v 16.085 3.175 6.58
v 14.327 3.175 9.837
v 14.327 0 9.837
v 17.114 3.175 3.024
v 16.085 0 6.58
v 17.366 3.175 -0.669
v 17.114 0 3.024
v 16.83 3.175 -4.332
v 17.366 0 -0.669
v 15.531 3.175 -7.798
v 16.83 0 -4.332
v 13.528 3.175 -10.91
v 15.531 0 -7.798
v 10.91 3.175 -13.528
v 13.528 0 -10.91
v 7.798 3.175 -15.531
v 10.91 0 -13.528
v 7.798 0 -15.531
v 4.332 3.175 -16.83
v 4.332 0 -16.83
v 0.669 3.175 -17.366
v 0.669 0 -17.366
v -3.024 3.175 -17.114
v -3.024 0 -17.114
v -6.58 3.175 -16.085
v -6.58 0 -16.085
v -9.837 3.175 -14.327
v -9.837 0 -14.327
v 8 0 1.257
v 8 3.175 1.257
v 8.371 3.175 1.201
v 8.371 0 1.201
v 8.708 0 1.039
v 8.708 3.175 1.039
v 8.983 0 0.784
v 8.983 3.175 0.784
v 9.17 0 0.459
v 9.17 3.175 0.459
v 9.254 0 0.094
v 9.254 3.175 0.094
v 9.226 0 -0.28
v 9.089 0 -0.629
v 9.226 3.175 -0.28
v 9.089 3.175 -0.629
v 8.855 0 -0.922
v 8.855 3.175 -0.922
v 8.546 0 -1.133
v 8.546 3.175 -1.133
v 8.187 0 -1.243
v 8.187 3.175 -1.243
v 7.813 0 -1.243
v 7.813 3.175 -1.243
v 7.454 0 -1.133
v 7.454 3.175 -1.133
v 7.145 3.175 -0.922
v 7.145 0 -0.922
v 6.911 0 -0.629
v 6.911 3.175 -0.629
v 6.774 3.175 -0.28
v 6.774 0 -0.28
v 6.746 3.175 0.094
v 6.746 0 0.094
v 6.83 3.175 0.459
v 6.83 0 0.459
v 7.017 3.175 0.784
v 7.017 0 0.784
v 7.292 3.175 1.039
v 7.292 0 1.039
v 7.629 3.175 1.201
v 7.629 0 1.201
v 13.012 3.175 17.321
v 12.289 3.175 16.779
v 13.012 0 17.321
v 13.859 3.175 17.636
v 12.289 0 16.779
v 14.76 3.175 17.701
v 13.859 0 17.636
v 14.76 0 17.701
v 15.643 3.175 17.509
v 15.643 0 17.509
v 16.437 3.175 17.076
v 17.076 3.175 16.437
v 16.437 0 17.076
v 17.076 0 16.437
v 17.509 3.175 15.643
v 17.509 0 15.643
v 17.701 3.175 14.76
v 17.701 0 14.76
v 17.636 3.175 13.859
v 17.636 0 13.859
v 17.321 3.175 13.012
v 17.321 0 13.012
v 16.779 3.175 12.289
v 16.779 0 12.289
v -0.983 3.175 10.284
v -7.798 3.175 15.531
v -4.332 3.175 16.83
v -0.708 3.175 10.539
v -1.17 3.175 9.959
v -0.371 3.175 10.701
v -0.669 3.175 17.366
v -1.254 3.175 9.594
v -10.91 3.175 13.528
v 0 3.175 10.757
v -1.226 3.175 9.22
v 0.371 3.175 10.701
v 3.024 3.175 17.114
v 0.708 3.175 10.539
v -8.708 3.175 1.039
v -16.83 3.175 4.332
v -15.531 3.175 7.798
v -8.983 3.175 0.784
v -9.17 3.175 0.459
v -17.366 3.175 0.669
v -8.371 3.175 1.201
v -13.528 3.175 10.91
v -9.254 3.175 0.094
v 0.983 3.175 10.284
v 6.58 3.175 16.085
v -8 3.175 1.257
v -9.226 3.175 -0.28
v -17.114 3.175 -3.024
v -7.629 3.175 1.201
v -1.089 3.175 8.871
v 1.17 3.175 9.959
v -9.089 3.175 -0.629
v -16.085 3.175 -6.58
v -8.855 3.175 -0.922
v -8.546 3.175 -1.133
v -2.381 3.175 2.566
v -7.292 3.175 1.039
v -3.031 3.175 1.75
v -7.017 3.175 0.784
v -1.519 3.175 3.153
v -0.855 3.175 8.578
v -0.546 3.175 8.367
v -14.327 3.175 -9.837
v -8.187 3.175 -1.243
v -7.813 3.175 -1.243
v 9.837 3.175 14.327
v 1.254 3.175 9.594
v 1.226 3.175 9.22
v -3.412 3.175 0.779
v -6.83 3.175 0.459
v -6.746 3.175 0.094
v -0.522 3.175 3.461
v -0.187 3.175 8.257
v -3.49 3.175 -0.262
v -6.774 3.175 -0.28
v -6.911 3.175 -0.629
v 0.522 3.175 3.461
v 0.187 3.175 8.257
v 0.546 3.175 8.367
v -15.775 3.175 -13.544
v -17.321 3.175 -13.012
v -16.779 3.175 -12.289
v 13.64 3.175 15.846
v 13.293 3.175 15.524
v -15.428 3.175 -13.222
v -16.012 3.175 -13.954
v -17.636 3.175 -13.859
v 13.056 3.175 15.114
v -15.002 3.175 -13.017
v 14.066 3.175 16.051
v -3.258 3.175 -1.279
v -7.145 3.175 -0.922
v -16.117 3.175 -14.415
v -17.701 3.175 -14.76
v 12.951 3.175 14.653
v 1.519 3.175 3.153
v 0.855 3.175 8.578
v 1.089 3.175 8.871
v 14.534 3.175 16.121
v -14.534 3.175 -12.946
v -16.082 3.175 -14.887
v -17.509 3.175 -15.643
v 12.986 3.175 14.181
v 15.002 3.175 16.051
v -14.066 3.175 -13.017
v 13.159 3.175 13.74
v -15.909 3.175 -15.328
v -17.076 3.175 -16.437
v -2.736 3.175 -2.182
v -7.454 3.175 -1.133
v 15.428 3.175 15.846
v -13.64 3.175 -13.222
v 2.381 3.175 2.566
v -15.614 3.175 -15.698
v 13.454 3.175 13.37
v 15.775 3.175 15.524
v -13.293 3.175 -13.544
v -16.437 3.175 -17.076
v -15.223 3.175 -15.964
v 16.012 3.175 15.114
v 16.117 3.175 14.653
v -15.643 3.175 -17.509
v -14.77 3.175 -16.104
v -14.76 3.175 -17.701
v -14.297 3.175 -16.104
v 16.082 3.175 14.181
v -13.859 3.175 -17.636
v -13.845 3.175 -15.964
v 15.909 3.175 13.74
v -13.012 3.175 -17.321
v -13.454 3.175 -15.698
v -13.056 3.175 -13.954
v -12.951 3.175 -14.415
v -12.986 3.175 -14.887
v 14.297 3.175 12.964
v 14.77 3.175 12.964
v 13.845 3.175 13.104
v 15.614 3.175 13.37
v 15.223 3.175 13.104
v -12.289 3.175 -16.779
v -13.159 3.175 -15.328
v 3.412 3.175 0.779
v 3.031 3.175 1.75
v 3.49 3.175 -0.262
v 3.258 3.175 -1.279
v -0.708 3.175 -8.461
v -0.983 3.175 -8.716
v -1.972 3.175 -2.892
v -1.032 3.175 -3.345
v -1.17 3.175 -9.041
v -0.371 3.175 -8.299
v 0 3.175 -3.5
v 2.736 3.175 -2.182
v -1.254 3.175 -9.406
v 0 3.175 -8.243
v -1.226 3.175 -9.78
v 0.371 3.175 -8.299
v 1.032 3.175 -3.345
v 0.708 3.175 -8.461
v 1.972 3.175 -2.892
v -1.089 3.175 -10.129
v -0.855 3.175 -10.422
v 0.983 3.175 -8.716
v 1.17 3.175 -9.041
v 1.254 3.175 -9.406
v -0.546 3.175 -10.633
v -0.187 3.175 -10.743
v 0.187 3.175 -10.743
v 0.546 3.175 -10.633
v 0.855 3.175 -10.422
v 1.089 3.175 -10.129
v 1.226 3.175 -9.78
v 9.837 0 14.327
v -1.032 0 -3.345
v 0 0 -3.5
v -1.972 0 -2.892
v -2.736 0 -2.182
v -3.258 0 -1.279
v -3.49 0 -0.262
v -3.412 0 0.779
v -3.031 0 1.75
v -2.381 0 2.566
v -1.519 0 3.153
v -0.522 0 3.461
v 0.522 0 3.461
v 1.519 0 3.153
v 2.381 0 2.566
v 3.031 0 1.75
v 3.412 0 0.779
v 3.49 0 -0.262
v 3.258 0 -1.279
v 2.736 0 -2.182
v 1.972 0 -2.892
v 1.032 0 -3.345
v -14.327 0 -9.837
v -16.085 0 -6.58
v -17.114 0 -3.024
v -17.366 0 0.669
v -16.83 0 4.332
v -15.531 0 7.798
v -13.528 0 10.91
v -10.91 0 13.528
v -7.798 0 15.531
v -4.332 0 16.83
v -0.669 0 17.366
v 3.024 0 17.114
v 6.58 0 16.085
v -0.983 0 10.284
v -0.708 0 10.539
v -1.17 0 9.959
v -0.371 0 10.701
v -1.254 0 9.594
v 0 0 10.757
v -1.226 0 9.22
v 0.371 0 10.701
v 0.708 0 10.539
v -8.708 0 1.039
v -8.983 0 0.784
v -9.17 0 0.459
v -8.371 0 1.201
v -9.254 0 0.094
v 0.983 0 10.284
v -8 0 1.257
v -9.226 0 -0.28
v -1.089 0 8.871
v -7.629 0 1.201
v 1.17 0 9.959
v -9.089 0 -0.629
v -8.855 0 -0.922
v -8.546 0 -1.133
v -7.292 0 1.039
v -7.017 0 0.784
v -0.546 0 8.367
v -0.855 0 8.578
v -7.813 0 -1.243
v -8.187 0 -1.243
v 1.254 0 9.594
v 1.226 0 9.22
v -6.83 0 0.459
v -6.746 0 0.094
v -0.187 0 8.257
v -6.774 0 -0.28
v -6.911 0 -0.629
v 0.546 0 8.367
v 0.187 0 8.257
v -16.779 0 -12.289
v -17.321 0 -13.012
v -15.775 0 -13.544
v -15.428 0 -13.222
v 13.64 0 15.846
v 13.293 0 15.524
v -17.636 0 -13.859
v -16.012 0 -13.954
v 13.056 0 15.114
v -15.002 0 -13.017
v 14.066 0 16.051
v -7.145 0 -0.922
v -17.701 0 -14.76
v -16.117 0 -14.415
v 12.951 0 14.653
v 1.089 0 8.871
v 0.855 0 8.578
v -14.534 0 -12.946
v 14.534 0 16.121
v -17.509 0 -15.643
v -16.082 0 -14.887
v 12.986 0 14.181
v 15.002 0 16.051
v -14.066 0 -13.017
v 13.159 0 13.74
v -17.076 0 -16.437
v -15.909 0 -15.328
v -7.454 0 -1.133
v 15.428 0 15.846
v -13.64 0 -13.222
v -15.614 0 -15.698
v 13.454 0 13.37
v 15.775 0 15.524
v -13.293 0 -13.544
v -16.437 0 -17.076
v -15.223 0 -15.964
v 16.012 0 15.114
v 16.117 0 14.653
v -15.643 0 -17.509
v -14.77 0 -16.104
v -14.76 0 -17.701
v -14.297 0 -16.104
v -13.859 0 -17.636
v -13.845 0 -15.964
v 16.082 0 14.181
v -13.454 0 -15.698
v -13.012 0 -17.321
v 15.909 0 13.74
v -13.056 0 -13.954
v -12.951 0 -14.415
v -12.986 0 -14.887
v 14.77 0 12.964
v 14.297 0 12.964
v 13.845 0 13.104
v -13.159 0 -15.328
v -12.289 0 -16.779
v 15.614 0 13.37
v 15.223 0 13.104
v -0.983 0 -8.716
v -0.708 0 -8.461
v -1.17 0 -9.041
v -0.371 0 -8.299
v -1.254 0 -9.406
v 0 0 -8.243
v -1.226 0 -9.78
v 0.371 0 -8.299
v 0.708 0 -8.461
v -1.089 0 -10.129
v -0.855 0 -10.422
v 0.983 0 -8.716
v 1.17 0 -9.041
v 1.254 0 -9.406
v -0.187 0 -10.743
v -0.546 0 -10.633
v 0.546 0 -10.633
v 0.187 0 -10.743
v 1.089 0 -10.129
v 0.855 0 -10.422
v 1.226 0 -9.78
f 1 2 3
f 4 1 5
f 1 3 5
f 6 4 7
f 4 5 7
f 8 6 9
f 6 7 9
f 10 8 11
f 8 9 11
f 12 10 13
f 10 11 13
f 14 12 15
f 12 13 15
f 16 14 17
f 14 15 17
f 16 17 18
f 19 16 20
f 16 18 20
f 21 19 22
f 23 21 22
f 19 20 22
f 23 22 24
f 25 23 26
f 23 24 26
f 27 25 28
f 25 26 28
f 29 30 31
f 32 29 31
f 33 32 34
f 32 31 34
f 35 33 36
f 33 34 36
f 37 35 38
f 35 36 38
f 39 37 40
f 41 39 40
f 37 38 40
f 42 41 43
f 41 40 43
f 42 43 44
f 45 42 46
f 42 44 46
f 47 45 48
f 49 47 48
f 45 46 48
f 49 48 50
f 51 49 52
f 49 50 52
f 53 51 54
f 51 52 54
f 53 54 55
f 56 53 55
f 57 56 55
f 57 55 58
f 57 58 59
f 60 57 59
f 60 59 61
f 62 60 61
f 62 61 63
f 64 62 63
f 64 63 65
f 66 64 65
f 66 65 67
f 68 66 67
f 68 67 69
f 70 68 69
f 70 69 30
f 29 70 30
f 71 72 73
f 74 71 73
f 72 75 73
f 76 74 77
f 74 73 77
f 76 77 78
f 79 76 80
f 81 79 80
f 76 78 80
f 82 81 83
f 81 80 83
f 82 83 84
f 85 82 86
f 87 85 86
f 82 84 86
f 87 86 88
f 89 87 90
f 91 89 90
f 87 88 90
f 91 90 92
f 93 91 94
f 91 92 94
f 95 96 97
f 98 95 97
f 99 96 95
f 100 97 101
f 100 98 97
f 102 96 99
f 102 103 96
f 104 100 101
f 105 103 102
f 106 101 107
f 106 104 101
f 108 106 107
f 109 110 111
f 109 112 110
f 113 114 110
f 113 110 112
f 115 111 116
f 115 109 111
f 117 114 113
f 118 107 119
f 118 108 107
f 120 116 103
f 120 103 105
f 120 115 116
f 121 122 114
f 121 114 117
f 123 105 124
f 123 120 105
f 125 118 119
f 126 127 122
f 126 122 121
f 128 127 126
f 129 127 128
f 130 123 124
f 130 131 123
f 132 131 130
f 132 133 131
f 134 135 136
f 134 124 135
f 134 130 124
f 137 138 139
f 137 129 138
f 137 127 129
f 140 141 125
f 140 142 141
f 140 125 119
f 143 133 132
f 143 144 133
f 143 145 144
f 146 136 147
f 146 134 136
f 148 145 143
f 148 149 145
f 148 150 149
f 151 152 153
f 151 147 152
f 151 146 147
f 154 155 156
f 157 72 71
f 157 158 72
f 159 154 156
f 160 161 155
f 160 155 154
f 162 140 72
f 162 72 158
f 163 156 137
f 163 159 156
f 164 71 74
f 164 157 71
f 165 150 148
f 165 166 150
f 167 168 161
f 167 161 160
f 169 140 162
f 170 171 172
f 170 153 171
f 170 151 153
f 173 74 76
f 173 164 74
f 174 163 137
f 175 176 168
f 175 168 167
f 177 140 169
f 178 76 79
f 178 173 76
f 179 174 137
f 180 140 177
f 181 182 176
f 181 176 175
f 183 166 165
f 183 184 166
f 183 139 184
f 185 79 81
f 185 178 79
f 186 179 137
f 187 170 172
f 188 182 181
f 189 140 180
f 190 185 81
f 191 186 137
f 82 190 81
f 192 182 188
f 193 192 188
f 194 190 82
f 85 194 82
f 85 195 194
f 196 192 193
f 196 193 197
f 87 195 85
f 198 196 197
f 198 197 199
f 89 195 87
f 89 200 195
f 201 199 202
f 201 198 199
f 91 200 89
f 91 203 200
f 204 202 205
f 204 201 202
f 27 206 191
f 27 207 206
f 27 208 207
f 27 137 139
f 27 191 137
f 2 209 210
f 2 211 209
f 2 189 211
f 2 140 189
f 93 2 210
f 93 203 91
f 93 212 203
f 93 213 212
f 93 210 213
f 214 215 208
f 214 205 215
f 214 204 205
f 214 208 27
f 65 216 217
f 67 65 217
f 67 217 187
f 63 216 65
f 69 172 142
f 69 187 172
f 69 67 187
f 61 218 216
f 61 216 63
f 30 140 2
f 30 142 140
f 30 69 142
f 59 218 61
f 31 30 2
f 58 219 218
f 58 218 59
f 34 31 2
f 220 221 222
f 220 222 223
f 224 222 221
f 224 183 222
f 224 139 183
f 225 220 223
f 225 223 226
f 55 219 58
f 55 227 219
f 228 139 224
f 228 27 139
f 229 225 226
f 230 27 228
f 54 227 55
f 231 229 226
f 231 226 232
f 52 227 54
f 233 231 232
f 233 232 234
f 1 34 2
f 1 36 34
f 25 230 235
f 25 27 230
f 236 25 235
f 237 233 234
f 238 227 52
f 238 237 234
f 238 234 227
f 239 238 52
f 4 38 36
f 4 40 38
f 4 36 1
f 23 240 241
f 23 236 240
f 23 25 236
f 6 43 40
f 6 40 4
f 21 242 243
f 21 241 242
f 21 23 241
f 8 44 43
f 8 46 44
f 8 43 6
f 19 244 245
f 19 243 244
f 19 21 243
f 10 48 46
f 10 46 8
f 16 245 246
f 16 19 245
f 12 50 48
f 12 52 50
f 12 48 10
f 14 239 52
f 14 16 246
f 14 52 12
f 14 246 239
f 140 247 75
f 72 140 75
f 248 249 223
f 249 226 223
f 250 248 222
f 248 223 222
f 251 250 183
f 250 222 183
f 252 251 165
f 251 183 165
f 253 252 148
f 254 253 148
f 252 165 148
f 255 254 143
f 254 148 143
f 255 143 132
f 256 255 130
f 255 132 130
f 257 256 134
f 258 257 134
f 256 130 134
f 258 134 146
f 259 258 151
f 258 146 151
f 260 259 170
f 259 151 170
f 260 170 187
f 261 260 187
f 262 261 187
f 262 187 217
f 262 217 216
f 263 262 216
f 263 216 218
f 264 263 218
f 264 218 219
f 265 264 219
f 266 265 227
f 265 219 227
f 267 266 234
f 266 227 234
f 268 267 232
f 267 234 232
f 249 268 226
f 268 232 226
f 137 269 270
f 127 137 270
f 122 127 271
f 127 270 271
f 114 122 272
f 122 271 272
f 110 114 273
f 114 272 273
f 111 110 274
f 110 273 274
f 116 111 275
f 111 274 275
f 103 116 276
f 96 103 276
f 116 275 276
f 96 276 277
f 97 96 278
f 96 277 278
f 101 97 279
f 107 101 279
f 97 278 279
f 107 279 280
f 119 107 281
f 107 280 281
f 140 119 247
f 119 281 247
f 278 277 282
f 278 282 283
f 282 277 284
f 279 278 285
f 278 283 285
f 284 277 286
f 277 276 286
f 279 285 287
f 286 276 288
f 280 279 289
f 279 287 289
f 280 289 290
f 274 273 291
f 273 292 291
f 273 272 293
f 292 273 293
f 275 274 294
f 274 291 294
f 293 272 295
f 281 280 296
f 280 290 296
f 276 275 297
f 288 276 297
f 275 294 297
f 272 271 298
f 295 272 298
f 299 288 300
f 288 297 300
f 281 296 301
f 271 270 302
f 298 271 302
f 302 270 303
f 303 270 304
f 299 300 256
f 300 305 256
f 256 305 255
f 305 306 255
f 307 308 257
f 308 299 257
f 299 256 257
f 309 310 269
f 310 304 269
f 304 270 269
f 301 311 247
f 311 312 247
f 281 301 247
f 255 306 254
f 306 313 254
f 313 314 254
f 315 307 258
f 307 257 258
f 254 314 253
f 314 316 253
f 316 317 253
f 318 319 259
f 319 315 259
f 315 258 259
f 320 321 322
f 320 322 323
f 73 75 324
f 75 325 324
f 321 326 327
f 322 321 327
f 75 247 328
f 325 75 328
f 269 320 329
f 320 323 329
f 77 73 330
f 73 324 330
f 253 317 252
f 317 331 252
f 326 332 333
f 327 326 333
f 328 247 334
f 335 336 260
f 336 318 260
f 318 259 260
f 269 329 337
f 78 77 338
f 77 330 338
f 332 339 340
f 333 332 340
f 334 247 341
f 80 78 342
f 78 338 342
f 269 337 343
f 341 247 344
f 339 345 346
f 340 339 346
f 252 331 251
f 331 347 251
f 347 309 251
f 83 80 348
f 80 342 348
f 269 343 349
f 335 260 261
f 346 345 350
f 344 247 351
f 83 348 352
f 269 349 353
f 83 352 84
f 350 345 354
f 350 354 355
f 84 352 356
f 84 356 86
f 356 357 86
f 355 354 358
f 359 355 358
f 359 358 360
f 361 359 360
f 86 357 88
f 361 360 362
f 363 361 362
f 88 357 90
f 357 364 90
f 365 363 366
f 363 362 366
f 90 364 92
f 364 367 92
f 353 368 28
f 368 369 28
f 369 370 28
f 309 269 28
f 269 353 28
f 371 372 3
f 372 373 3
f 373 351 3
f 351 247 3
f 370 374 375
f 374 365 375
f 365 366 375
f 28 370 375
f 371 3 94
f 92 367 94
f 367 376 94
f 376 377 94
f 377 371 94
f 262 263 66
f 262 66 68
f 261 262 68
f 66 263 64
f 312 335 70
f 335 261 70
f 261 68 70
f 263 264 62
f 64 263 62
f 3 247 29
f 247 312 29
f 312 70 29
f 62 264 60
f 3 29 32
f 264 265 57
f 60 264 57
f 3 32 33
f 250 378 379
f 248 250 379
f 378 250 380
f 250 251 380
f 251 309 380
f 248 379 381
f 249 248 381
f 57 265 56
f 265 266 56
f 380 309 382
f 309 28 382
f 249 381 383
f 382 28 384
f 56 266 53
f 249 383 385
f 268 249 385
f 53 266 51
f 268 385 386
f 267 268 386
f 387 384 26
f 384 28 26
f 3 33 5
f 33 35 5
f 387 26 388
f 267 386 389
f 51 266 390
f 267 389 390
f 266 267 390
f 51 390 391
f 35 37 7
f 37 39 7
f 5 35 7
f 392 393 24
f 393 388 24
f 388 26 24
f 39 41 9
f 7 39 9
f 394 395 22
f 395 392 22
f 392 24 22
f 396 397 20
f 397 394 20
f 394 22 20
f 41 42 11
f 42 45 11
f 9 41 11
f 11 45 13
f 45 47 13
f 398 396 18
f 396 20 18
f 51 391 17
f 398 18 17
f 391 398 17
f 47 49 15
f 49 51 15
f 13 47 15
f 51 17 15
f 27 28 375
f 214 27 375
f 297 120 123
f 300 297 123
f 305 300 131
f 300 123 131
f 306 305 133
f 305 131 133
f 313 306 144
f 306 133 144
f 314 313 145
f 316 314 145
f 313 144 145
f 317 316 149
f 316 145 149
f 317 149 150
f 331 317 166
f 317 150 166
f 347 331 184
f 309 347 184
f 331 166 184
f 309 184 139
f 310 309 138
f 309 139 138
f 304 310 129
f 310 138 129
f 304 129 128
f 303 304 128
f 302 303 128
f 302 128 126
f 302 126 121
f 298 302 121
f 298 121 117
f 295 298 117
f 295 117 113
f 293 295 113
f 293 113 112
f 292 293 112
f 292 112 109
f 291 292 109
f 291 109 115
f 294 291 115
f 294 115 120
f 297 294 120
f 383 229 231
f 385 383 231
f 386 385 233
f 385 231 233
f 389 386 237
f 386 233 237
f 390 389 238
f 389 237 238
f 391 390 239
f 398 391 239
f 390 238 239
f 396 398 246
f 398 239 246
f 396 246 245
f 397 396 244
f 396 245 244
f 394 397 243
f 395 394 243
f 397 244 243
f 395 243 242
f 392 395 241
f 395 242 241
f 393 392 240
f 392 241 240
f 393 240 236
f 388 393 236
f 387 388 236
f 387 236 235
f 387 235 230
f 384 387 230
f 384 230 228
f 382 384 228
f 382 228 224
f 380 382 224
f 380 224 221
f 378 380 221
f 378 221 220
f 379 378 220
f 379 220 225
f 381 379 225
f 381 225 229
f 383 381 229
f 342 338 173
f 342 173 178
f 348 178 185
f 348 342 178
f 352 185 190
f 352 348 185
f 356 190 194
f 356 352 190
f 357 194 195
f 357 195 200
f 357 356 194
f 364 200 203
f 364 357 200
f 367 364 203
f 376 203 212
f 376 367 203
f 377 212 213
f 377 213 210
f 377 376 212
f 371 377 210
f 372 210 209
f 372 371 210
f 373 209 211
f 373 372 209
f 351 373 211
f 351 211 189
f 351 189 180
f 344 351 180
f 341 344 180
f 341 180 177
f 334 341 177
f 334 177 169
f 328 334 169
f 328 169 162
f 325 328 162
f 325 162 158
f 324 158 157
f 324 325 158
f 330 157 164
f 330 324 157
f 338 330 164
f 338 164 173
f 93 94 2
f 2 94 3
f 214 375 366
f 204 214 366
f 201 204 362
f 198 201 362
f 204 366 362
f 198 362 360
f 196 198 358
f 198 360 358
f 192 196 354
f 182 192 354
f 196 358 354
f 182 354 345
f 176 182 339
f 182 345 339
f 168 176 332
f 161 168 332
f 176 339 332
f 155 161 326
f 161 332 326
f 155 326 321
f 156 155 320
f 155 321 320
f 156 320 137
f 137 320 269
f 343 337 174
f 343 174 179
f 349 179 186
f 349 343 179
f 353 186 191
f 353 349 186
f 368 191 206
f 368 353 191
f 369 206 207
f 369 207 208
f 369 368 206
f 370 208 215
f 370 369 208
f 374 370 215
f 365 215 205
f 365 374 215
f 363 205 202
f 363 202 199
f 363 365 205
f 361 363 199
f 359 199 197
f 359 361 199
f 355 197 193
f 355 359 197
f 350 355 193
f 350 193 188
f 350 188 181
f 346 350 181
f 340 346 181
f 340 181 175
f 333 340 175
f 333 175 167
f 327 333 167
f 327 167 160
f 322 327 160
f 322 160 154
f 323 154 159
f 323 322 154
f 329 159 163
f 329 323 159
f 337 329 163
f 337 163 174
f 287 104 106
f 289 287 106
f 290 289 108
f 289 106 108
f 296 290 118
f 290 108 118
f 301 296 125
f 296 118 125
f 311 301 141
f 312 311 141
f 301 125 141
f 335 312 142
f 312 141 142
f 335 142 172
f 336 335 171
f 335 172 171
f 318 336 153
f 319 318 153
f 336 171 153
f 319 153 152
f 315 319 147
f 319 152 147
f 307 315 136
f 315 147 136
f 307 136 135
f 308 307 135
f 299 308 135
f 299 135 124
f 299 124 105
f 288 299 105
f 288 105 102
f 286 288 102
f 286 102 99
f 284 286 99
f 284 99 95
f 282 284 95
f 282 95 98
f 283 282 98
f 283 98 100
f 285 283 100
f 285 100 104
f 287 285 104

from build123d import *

# Parameters (mm, degrees)
SKETCH3_R           = 1.2573
CUT_EXTRUDE1_DEPTH  = 25.781842813
SKETCH4_R           = 3.175
SKETCH4_R_2         = 1.5875
BOSS_EXTRUDE1_DEPTH = 3.175


with BuildPart() as part:
    # Sketch1 → Revolve1 (revolve)
    with BuildSketch(Plane.XY, mode=Mode.PRIVATE) as revolve1_sk:
        Polygon((17.3789975, 3.175), (17.3789975, 0), (3.5, 0), (3.5, 3.175), (14.2039975, 3.175), align=None)
    revolve(revolve1_sk.sketch.rotate(Axis((0, 0, 0), (0, 1, 0)), 90), axis=Axis((0, 0, 0), (0, 1, 0)))

    # Sketch3 → Cut-Extrude1 (cut, through all)
    with BuildSketch(Plane(origin=(0, 3.175, 0), x_dir=(1, 0, 0), z_dir=(0, 1, 0))):
        with Locations(Location((0, -9.5, 0), (0, 0, 270))):
            Circle(SKETCH3_R)
        with Locations(Location((-8.000000002, 0, 0), (0, 0, 270))):
            Circle(SKETCH3_R)
        with Locations(Location((0, 9.5, 0), (0, 0, 270))):
            Circle(SKETCH3_R)
        with Locations(Location((8.000000002, 0, 0), (0, 0, 270))):
            Circle(SKETCH3_R)
    extrude(amount=-CUT_EXTRUDE1_DEPTH, mode=Mode.SUBTRACT)

    # Sketch4 → Boss-Extrude1 (add)
    # profile 1 of 6: a face of its own
    with BuildSketch(Plane(origin=(0, 0, 0), x_dir=(1, 0, 0), z_dir=(0, 1, 0))):
        with Locations((-14.533871013, 14.533871013)):
            Circle(SKETCH4_R)
        with Locations(Location((-14.533871013, 14.533871013, 0), (0, 0, 270))):
            Circle(SKETCH4_R_2, mode=Mode.SUBTRACT)
    # profile 2 of 6: a face of its own
    with BuildSketch(Plane(origin=(0, 0, 0), x_dir=(1, 0, 0), z_dir=(0, 1, 0))):
        with BuildLine():
            ThreePointArc((-12.288807066, 12.288806898), (-11.109708346, 13.364278303), (-9.836925233, 14.327053293))
            Line((-9.836925233, 14.327053293), (-12.288806982, 16.778935043))
            ThreePointArc((-12.288806982, 16.778935043), (-11.600553497, 15.74889091), (-11.358871013, 14.533871013))
            ThreePointArc((-11.358871013, 14.533871013), (-11.60055352, 13.31885106), (-12.288807066, 12.288806899))
        make_face()
    # profile 3 of 6: a face of its own
    with BuildSketch(Plane(origin=(0, 0, 0), x_dir=(1, 0, 0), z_dir=(0, 1, 0))):
        with BuildLine():
            ThreePointArc((-14.327053293, 9.836925233), (-13.364278379, 11.109708255), (-12.288807066, 12.288806898))
            ThreePointArc((-12.288807066, 12.288806899), (-14.533871072, 11.358871013), (-16.778935043, 12.288806982))
            Line((-16.778935043, 12.288806982), (-14.327053293, 9.836925233))
        make_face()
    # profile 4 of 6: a face of its own
    with BuildSketch(Plane(origin=(0, 0, 0), x_dir=(1, 0, 0), z_dir=(0, 1, 0))):
        with Locations((14.533871013, -14.533871013)):
            Circle(SKETCH4_R)
        with Locations(Location((14.533871013, -14.533871013, 0), (0, 0, 270))):
            Circle(SKETCH4_R_2, mode=Mode.SUBTRACT)
    # profile 5 of 6: a face of its own
    with BuildSketch(Plane(origin=(0, 0, 0), x_dir=(1, 0, 0), z_dir=(0, 1, 0))):
        with BuildLine():
            ThreePointArc((12.288806982, -16.778935043), (11.358871013, -14.533870968), (12.288807046, -12.288806919))
            ThreePointArc((12.288807046, -12.288806919), (11.109708335, -13.364278313), (9.836925233, -14.327053293))
            Line((9.836925233, -14.327053293), (12.288806982, -16.778935043))
        make_face()
    # profile 6 of 6: a face of its own
    with BuildSketch(Plane(origin=(0, 0, 0), x_dir=(1, 0, 0), z_dir=(0, 1, 0))):
        with BuildLine():
            ThreePointArc((12.288807046, -12.288806919), (14.533871058, -11.358871013), (16.778935043, -12.288806982))
            Line((16.778935043, -12.288806982), (14.327053293, -9.836925233))
            ThreePointArc((14.327053293, -9.836925233), (13.36427837, -11.109708266), (12.288807046, -12.288806919))
        make_face()
    extrude(amount=BOSS_EXTRUDE1_DEPTH)


solid = part.part
